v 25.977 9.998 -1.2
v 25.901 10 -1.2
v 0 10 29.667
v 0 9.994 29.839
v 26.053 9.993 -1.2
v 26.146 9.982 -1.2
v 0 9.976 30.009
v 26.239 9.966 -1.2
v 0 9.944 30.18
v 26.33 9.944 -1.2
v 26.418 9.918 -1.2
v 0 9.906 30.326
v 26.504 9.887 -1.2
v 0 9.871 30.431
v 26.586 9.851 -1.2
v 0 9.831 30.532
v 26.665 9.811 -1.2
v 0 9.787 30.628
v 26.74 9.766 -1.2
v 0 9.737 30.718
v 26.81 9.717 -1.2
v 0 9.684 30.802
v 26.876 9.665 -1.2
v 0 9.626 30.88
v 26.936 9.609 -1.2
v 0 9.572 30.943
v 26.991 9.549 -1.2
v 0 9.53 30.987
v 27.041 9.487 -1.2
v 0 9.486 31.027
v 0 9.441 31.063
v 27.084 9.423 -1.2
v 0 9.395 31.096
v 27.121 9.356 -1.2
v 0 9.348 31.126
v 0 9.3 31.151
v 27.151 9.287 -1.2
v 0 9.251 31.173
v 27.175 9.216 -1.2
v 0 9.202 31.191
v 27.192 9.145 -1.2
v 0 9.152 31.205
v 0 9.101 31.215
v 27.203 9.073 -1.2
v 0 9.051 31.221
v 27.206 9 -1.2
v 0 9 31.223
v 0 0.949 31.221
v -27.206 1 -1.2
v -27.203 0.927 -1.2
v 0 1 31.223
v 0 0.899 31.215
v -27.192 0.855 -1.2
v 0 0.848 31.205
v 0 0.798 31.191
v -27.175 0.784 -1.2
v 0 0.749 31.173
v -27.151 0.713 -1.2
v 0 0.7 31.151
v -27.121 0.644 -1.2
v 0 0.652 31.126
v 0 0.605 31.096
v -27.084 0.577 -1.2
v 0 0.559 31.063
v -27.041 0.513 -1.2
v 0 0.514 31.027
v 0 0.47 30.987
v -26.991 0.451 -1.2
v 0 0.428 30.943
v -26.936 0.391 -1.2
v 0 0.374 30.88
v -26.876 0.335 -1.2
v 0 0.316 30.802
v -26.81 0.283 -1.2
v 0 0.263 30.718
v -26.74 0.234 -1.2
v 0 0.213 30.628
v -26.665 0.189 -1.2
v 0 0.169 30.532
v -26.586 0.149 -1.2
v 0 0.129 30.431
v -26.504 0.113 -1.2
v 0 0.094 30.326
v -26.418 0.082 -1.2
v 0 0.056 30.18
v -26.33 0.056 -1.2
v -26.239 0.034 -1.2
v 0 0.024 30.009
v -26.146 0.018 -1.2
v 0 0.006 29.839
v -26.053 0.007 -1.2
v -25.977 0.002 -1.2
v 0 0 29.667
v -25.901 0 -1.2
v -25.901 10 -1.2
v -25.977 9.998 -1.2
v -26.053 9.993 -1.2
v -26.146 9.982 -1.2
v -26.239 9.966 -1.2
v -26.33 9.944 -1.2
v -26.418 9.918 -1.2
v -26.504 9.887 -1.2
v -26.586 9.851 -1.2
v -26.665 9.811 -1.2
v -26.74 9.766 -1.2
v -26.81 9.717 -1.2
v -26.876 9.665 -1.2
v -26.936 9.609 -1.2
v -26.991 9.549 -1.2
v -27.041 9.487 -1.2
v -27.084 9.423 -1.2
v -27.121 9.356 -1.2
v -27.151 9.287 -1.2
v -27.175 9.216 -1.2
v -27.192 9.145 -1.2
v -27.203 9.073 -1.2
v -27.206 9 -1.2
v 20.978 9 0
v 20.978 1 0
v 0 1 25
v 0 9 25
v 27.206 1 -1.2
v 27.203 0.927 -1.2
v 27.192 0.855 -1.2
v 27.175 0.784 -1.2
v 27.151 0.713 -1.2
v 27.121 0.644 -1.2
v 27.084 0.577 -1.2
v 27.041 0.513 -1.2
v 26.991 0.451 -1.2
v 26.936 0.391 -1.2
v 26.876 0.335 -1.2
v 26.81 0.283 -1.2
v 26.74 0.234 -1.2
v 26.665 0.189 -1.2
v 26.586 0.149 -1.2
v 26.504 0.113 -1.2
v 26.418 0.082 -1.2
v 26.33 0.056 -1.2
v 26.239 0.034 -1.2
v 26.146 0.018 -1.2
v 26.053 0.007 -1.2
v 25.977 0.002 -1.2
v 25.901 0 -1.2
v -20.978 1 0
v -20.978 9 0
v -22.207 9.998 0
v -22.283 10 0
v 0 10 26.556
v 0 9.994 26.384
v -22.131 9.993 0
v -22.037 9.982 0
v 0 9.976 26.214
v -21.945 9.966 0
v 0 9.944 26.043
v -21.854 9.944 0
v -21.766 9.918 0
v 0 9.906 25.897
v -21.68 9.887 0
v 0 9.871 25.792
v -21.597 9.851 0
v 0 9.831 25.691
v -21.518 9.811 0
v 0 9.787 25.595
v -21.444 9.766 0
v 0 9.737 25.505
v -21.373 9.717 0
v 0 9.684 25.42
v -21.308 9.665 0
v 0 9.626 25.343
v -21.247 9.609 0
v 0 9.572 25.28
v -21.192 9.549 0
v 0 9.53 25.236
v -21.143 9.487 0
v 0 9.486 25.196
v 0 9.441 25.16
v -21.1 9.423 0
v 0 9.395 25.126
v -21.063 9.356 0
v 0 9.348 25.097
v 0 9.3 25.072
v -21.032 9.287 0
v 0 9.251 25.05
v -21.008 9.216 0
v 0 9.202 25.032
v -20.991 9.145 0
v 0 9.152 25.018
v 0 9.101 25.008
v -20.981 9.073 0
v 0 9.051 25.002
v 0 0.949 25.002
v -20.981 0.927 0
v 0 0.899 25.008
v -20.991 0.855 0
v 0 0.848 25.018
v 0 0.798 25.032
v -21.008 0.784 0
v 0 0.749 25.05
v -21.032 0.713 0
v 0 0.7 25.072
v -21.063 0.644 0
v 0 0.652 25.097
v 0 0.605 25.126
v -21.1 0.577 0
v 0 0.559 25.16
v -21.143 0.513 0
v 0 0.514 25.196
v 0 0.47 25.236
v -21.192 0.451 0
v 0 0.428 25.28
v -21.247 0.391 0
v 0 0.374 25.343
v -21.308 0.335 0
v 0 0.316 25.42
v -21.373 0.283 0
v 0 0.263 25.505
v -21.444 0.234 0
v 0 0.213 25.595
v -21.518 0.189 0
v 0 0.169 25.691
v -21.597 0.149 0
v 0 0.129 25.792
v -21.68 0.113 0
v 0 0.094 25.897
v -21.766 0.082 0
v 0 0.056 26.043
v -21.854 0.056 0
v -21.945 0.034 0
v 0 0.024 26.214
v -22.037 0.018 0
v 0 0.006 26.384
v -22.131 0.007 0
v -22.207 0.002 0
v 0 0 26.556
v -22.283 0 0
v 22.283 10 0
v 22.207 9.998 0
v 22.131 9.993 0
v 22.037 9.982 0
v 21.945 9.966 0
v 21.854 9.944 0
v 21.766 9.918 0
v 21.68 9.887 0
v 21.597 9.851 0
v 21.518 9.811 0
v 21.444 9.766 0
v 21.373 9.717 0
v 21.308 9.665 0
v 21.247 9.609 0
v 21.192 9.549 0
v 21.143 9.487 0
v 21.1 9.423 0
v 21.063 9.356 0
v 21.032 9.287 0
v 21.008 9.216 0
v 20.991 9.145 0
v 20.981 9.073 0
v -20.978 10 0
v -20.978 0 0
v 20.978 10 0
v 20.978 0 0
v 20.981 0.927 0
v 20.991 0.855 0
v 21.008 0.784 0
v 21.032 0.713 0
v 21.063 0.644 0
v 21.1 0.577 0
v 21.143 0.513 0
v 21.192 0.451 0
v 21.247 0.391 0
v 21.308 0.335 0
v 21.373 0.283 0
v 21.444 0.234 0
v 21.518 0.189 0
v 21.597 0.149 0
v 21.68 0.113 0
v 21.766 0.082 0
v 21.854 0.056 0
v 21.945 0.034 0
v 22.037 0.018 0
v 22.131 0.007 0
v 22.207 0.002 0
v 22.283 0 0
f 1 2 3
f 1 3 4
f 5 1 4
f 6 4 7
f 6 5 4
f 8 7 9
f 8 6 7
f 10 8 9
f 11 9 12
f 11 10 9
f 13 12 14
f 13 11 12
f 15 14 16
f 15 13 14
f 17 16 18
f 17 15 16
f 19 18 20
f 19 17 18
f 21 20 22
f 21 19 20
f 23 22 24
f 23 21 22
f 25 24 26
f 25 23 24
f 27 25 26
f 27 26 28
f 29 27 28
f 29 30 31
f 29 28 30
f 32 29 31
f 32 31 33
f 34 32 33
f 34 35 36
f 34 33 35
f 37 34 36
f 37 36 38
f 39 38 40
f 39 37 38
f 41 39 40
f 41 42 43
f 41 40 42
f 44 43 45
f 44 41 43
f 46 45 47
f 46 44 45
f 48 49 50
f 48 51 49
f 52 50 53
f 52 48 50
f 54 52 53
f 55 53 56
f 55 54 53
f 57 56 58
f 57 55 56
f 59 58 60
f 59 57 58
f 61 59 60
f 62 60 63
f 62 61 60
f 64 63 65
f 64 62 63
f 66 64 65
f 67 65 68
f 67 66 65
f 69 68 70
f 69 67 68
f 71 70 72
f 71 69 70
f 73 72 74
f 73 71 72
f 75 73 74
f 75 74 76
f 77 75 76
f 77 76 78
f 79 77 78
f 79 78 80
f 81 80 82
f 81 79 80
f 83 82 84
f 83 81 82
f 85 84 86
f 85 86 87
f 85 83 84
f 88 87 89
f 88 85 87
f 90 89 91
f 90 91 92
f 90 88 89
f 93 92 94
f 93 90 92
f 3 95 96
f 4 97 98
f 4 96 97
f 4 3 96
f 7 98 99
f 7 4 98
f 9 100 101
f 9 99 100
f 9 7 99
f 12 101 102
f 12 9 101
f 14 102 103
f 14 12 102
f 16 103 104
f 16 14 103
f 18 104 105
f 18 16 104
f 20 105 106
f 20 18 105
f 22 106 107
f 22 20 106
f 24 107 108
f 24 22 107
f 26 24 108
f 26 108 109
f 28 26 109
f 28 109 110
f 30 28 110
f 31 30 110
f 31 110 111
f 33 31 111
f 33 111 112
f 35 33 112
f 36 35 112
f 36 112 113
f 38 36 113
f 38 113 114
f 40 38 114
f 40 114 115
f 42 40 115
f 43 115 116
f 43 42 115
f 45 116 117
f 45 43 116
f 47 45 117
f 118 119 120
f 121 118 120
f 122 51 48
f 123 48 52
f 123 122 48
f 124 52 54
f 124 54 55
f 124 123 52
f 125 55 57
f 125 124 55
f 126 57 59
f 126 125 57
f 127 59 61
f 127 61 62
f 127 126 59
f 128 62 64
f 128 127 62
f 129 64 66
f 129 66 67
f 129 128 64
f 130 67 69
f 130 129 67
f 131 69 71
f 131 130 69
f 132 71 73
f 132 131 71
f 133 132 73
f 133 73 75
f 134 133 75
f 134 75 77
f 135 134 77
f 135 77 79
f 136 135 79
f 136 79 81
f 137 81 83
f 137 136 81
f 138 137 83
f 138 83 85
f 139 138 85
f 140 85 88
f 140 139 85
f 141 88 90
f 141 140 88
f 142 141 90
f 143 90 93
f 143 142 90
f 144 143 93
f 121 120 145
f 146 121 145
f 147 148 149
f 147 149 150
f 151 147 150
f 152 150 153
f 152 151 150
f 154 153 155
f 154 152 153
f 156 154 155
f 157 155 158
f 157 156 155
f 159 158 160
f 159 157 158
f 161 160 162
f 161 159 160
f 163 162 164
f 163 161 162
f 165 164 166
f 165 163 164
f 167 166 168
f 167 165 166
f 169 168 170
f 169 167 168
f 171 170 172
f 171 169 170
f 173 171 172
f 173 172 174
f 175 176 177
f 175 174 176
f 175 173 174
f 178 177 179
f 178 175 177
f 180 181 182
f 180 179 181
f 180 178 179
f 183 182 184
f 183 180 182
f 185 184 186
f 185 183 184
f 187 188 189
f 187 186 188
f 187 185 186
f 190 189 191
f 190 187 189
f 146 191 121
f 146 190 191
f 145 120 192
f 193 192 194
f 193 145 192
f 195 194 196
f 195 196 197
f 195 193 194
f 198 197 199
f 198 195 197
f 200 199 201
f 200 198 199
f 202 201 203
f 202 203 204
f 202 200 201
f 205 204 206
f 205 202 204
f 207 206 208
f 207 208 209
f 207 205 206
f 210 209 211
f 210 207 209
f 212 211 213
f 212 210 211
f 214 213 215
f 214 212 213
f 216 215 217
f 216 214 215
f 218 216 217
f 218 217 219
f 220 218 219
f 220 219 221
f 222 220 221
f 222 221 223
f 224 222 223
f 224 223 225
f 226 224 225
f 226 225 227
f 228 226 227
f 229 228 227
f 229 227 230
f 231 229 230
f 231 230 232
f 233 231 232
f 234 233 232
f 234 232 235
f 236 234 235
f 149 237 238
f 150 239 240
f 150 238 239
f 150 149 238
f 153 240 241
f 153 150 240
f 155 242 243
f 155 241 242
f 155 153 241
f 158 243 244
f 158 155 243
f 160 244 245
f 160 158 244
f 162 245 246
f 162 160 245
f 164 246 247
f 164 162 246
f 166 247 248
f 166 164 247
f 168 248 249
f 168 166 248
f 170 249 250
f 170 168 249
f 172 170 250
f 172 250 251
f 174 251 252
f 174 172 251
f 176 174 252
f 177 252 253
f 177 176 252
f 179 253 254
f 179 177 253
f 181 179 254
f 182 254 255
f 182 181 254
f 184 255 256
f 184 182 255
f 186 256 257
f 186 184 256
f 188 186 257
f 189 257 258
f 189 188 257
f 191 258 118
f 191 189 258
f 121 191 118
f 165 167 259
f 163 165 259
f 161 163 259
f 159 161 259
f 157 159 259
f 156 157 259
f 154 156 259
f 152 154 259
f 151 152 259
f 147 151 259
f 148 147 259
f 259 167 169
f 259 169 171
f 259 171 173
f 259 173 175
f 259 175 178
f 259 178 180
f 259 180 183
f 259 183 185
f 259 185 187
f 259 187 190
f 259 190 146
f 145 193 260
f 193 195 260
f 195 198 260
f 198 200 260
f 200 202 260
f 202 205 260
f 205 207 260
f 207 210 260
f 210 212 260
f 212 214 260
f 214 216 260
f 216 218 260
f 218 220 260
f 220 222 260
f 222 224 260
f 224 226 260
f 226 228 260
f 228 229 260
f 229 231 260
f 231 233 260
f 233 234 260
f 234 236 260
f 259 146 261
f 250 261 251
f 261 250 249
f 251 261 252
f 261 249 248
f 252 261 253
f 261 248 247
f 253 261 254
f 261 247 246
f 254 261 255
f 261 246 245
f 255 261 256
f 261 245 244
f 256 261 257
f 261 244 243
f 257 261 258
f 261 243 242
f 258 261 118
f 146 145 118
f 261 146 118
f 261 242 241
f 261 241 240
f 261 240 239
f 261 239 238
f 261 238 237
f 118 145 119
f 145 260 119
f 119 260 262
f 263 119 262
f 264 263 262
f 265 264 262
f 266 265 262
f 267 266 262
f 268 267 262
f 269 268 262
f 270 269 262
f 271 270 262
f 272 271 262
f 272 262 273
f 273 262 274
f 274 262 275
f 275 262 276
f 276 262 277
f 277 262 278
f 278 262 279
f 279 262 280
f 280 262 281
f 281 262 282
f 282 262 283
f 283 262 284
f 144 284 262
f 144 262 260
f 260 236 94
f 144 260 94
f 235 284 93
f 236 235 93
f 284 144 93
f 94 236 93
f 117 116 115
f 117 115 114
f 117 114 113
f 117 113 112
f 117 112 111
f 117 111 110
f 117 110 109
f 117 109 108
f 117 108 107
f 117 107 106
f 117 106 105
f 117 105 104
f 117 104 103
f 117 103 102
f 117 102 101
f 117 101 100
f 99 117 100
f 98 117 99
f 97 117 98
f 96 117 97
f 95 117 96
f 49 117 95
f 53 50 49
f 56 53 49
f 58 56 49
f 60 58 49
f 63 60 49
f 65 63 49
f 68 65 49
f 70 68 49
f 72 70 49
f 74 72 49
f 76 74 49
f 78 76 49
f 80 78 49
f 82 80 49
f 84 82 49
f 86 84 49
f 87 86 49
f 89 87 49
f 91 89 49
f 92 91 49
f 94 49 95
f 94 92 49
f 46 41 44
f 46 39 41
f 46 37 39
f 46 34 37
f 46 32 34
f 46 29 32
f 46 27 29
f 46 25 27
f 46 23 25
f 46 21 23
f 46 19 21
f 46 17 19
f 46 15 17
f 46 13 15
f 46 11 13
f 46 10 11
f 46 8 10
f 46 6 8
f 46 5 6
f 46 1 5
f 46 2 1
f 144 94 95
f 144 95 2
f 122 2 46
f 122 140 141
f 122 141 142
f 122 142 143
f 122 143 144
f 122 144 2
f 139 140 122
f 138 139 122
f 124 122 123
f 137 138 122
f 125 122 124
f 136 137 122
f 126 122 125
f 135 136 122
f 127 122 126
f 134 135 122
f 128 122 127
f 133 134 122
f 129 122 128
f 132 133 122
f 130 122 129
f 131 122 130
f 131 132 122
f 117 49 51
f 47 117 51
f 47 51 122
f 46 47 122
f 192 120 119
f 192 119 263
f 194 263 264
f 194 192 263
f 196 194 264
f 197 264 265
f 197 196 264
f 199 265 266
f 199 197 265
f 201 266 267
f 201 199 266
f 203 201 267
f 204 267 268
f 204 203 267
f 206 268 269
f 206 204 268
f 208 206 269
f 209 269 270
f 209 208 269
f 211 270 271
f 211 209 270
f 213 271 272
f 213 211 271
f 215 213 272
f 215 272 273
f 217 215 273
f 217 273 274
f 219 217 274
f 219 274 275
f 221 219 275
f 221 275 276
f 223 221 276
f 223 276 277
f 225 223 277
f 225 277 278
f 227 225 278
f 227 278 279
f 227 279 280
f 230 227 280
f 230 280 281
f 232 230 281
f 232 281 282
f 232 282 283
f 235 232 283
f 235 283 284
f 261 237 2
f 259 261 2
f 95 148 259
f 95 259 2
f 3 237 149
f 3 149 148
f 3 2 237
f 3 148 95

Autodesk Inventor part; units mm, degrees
ref_plane "YZ Plane" through (0, 0, 0) normal (1, 0, 0) x (0, 1, 0)
ref_plane "XZ Plane" through (0, 0, 0) normal (0, 1, 0) x (-1, 0, 0)
ref_plane "XY Plane" through (0, 0, 0) normal (0, 0, 1) x (1, 0, 0)
sketch "Sketch1" plane through (0, 0, 0) normal (0, 1, 0) x (-1, 0, 0)
  line L0 (-20.9775, 0) -> (0, 25)
  line L1 (0, 25) -> (20.9775, 0)
  line L2 (20.9775, 0) -> (-20.9775, 0)
  line L3 (0, 25) -> (0, 0) construction
  line L4 (0, 31.2229) -> (-29.5555, -4)
  line L5 (-29.5555, -4) -> (29.5555, -4)
  line L6 (29.5555, -4) -> (0, 31.2229)
  line L7 (27.206, -1.2) -> (-27.206, -1.2)
  dimension "d0" = 40
  dimension "d1" = 25
  dimension "d2" = 4
  dimension "d6" = 1.2
extrude "Extrusion1" add sketch "Sketch1" along normal blind 10 contours L6 L7 L4
fillet "Fillet1" radius 1 8 edges at (10.4887, 10, 12.5) (-10.4887, 10, 12.5) (-13.603, 0, 15.0114) (-10.4887, 0, 12.5) (-13.603, 10, 15.0114) (10.4887, 0, 12.5) (13.603, 0, 15.0114) (13.603, 10, 15.0114)
properties part number "test-triangle-overhang"
